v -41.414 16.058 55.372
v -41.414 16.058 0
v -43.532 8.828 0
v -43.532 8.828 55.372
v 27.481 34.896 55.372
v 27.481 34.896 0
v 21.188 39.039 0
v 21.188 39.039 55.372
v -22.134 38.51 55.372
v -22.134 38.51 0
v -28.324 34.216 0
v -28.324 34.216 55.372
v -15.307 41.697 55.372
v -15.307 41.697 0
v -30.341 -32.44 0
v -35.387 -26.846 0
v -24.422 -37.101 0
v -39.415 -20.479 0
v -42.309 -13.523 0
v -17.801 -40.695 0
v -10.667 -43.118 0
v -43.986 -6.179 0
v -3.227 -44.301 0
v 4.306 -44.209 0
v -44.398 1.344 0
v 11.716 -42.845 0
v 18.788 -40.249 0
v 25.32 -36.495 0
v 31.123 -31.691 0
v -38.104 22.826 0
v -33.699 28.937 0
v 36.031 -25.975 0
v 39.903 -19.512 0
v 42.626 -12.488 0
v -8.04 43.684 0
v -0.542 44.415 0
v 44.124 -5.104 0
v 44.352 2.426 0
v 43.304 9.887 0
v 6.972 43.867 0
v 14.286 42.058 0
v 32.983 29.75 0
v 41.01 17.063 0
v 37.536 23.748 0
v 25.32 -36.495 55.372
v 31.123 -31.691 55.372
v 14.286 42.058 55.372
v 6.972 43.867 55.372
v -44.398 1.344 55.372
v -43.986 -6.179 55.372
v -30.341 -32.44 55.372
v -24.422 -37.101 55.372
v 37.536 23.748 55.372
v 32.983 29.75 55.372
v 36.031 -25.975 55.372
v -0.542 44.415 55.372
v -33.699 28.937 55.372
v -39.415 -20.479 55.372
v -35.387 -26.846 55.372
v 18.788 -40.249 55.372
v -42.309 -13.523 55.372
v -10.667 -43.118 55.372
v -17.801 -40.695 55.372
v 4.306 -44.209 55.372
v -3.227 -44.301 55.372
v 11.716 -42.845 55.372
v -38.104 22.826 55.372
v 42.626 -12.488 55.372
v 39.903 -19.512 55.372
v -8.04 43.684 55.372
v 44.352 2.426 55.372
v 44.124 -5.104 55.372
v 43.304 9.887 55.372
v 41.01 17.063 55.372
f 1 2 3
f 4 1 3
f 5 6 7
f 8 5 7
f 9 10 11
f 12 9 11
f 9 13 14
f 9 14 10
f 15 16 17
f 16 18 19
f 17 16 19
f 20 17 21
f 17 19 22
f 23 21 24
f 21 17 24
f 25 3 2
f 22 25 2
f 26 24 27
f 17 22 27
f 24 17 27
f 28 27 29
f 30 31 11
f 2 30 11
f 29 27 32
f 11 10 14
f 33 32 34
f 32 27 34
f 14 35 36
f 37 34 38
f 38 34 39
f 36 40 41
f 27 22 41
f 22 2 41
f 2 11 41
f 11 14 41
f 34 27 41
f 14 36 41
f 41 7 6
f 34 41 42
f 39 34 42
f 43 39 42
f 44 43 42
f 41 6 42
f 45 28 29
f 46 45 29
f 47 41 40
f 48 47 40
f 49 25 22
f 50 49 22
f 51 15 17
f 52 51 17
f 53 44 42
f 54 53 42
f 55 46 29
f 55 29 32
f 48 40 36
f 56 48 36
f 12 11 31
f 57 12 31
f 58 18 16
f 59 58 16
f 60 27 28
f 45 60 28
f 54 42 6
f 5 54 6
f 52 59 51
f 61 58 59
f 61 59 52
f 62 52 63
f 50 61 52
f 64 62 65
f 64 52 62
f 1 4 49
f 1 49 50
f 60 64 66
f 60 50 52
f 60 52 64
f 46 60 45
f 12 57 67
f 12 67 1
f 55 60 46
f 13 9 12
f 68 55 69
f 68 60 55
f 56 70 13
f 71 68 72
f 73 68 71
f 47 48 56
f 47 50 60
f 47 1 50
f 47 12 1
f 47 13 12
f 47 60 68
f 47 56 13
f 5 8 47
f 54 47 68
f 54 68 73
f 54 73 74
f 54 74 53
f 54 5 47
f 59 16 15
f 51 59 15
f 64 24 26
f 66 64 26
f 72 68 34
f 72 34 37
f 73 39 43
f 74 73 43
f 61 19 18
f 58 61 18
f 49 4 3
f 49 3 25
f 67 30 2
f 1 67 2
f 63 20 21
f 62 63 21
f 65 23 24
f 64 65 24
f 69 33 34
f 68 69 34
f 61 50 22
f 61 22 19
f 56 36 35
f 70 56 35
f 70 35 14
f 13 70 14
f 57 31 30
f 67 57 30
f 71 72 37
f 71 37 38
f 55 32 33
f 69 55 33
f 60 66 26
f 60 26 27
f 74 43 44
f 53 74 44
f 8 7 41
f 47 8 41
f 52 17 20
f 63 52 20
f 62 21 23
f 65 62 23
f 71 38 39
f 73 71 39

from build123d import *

# Parameters (mm, degrees)
F1_DEPTH = 55.372


with BuildPart() as f1:
    # F0 (on Top) → F1 (new body)
    with BuildSketch(Plane.XY):
        Polygon((39.90279, -19.511992), (42.626367, -12.487726), (44.123662, -5.10421), (44.351599, 2.426144), (43.303621, 9.886703), (41.009877, 17.062839), (37.536354, 23.748109), (32.982977, 29.750188), (27.480741, 34.896409), (21.187934, 39.038724), (14.285588, 42.057965), (6.972273, 43.867276), (-0.541623, 44.414605), (-8.039937, 43.684207), (-15.306956, 41.697093), (-22.133623, 38.51043), (-28.323545, 34.215892), (-33.698651, 28.937026), (-38.104307, 22.825693), (-41.413772, 16.057707), (-43.531839, 8.82777), (-44.397573, 1.343874), (-43.98607, -6.178682), (-42.309168, -13.52349), (-39.415109, -20.479251), (-35.387148, -26.845861), (-30.341164, -32.440165), (-24.422319, -37.101224), (-17.800889, -40.694949), (-10.66736, -43.117954), (-3.22695, -44.300534), (4.306293, -44.208668), (11.715652, -42.845), (18.787973, -40.248758), (25.319799, -36.494634), (31.12322, -31.690625), (36.031282, -25.974934), align=None)
    extrude(amount=F1_DEPTH)


solid = f1.part
